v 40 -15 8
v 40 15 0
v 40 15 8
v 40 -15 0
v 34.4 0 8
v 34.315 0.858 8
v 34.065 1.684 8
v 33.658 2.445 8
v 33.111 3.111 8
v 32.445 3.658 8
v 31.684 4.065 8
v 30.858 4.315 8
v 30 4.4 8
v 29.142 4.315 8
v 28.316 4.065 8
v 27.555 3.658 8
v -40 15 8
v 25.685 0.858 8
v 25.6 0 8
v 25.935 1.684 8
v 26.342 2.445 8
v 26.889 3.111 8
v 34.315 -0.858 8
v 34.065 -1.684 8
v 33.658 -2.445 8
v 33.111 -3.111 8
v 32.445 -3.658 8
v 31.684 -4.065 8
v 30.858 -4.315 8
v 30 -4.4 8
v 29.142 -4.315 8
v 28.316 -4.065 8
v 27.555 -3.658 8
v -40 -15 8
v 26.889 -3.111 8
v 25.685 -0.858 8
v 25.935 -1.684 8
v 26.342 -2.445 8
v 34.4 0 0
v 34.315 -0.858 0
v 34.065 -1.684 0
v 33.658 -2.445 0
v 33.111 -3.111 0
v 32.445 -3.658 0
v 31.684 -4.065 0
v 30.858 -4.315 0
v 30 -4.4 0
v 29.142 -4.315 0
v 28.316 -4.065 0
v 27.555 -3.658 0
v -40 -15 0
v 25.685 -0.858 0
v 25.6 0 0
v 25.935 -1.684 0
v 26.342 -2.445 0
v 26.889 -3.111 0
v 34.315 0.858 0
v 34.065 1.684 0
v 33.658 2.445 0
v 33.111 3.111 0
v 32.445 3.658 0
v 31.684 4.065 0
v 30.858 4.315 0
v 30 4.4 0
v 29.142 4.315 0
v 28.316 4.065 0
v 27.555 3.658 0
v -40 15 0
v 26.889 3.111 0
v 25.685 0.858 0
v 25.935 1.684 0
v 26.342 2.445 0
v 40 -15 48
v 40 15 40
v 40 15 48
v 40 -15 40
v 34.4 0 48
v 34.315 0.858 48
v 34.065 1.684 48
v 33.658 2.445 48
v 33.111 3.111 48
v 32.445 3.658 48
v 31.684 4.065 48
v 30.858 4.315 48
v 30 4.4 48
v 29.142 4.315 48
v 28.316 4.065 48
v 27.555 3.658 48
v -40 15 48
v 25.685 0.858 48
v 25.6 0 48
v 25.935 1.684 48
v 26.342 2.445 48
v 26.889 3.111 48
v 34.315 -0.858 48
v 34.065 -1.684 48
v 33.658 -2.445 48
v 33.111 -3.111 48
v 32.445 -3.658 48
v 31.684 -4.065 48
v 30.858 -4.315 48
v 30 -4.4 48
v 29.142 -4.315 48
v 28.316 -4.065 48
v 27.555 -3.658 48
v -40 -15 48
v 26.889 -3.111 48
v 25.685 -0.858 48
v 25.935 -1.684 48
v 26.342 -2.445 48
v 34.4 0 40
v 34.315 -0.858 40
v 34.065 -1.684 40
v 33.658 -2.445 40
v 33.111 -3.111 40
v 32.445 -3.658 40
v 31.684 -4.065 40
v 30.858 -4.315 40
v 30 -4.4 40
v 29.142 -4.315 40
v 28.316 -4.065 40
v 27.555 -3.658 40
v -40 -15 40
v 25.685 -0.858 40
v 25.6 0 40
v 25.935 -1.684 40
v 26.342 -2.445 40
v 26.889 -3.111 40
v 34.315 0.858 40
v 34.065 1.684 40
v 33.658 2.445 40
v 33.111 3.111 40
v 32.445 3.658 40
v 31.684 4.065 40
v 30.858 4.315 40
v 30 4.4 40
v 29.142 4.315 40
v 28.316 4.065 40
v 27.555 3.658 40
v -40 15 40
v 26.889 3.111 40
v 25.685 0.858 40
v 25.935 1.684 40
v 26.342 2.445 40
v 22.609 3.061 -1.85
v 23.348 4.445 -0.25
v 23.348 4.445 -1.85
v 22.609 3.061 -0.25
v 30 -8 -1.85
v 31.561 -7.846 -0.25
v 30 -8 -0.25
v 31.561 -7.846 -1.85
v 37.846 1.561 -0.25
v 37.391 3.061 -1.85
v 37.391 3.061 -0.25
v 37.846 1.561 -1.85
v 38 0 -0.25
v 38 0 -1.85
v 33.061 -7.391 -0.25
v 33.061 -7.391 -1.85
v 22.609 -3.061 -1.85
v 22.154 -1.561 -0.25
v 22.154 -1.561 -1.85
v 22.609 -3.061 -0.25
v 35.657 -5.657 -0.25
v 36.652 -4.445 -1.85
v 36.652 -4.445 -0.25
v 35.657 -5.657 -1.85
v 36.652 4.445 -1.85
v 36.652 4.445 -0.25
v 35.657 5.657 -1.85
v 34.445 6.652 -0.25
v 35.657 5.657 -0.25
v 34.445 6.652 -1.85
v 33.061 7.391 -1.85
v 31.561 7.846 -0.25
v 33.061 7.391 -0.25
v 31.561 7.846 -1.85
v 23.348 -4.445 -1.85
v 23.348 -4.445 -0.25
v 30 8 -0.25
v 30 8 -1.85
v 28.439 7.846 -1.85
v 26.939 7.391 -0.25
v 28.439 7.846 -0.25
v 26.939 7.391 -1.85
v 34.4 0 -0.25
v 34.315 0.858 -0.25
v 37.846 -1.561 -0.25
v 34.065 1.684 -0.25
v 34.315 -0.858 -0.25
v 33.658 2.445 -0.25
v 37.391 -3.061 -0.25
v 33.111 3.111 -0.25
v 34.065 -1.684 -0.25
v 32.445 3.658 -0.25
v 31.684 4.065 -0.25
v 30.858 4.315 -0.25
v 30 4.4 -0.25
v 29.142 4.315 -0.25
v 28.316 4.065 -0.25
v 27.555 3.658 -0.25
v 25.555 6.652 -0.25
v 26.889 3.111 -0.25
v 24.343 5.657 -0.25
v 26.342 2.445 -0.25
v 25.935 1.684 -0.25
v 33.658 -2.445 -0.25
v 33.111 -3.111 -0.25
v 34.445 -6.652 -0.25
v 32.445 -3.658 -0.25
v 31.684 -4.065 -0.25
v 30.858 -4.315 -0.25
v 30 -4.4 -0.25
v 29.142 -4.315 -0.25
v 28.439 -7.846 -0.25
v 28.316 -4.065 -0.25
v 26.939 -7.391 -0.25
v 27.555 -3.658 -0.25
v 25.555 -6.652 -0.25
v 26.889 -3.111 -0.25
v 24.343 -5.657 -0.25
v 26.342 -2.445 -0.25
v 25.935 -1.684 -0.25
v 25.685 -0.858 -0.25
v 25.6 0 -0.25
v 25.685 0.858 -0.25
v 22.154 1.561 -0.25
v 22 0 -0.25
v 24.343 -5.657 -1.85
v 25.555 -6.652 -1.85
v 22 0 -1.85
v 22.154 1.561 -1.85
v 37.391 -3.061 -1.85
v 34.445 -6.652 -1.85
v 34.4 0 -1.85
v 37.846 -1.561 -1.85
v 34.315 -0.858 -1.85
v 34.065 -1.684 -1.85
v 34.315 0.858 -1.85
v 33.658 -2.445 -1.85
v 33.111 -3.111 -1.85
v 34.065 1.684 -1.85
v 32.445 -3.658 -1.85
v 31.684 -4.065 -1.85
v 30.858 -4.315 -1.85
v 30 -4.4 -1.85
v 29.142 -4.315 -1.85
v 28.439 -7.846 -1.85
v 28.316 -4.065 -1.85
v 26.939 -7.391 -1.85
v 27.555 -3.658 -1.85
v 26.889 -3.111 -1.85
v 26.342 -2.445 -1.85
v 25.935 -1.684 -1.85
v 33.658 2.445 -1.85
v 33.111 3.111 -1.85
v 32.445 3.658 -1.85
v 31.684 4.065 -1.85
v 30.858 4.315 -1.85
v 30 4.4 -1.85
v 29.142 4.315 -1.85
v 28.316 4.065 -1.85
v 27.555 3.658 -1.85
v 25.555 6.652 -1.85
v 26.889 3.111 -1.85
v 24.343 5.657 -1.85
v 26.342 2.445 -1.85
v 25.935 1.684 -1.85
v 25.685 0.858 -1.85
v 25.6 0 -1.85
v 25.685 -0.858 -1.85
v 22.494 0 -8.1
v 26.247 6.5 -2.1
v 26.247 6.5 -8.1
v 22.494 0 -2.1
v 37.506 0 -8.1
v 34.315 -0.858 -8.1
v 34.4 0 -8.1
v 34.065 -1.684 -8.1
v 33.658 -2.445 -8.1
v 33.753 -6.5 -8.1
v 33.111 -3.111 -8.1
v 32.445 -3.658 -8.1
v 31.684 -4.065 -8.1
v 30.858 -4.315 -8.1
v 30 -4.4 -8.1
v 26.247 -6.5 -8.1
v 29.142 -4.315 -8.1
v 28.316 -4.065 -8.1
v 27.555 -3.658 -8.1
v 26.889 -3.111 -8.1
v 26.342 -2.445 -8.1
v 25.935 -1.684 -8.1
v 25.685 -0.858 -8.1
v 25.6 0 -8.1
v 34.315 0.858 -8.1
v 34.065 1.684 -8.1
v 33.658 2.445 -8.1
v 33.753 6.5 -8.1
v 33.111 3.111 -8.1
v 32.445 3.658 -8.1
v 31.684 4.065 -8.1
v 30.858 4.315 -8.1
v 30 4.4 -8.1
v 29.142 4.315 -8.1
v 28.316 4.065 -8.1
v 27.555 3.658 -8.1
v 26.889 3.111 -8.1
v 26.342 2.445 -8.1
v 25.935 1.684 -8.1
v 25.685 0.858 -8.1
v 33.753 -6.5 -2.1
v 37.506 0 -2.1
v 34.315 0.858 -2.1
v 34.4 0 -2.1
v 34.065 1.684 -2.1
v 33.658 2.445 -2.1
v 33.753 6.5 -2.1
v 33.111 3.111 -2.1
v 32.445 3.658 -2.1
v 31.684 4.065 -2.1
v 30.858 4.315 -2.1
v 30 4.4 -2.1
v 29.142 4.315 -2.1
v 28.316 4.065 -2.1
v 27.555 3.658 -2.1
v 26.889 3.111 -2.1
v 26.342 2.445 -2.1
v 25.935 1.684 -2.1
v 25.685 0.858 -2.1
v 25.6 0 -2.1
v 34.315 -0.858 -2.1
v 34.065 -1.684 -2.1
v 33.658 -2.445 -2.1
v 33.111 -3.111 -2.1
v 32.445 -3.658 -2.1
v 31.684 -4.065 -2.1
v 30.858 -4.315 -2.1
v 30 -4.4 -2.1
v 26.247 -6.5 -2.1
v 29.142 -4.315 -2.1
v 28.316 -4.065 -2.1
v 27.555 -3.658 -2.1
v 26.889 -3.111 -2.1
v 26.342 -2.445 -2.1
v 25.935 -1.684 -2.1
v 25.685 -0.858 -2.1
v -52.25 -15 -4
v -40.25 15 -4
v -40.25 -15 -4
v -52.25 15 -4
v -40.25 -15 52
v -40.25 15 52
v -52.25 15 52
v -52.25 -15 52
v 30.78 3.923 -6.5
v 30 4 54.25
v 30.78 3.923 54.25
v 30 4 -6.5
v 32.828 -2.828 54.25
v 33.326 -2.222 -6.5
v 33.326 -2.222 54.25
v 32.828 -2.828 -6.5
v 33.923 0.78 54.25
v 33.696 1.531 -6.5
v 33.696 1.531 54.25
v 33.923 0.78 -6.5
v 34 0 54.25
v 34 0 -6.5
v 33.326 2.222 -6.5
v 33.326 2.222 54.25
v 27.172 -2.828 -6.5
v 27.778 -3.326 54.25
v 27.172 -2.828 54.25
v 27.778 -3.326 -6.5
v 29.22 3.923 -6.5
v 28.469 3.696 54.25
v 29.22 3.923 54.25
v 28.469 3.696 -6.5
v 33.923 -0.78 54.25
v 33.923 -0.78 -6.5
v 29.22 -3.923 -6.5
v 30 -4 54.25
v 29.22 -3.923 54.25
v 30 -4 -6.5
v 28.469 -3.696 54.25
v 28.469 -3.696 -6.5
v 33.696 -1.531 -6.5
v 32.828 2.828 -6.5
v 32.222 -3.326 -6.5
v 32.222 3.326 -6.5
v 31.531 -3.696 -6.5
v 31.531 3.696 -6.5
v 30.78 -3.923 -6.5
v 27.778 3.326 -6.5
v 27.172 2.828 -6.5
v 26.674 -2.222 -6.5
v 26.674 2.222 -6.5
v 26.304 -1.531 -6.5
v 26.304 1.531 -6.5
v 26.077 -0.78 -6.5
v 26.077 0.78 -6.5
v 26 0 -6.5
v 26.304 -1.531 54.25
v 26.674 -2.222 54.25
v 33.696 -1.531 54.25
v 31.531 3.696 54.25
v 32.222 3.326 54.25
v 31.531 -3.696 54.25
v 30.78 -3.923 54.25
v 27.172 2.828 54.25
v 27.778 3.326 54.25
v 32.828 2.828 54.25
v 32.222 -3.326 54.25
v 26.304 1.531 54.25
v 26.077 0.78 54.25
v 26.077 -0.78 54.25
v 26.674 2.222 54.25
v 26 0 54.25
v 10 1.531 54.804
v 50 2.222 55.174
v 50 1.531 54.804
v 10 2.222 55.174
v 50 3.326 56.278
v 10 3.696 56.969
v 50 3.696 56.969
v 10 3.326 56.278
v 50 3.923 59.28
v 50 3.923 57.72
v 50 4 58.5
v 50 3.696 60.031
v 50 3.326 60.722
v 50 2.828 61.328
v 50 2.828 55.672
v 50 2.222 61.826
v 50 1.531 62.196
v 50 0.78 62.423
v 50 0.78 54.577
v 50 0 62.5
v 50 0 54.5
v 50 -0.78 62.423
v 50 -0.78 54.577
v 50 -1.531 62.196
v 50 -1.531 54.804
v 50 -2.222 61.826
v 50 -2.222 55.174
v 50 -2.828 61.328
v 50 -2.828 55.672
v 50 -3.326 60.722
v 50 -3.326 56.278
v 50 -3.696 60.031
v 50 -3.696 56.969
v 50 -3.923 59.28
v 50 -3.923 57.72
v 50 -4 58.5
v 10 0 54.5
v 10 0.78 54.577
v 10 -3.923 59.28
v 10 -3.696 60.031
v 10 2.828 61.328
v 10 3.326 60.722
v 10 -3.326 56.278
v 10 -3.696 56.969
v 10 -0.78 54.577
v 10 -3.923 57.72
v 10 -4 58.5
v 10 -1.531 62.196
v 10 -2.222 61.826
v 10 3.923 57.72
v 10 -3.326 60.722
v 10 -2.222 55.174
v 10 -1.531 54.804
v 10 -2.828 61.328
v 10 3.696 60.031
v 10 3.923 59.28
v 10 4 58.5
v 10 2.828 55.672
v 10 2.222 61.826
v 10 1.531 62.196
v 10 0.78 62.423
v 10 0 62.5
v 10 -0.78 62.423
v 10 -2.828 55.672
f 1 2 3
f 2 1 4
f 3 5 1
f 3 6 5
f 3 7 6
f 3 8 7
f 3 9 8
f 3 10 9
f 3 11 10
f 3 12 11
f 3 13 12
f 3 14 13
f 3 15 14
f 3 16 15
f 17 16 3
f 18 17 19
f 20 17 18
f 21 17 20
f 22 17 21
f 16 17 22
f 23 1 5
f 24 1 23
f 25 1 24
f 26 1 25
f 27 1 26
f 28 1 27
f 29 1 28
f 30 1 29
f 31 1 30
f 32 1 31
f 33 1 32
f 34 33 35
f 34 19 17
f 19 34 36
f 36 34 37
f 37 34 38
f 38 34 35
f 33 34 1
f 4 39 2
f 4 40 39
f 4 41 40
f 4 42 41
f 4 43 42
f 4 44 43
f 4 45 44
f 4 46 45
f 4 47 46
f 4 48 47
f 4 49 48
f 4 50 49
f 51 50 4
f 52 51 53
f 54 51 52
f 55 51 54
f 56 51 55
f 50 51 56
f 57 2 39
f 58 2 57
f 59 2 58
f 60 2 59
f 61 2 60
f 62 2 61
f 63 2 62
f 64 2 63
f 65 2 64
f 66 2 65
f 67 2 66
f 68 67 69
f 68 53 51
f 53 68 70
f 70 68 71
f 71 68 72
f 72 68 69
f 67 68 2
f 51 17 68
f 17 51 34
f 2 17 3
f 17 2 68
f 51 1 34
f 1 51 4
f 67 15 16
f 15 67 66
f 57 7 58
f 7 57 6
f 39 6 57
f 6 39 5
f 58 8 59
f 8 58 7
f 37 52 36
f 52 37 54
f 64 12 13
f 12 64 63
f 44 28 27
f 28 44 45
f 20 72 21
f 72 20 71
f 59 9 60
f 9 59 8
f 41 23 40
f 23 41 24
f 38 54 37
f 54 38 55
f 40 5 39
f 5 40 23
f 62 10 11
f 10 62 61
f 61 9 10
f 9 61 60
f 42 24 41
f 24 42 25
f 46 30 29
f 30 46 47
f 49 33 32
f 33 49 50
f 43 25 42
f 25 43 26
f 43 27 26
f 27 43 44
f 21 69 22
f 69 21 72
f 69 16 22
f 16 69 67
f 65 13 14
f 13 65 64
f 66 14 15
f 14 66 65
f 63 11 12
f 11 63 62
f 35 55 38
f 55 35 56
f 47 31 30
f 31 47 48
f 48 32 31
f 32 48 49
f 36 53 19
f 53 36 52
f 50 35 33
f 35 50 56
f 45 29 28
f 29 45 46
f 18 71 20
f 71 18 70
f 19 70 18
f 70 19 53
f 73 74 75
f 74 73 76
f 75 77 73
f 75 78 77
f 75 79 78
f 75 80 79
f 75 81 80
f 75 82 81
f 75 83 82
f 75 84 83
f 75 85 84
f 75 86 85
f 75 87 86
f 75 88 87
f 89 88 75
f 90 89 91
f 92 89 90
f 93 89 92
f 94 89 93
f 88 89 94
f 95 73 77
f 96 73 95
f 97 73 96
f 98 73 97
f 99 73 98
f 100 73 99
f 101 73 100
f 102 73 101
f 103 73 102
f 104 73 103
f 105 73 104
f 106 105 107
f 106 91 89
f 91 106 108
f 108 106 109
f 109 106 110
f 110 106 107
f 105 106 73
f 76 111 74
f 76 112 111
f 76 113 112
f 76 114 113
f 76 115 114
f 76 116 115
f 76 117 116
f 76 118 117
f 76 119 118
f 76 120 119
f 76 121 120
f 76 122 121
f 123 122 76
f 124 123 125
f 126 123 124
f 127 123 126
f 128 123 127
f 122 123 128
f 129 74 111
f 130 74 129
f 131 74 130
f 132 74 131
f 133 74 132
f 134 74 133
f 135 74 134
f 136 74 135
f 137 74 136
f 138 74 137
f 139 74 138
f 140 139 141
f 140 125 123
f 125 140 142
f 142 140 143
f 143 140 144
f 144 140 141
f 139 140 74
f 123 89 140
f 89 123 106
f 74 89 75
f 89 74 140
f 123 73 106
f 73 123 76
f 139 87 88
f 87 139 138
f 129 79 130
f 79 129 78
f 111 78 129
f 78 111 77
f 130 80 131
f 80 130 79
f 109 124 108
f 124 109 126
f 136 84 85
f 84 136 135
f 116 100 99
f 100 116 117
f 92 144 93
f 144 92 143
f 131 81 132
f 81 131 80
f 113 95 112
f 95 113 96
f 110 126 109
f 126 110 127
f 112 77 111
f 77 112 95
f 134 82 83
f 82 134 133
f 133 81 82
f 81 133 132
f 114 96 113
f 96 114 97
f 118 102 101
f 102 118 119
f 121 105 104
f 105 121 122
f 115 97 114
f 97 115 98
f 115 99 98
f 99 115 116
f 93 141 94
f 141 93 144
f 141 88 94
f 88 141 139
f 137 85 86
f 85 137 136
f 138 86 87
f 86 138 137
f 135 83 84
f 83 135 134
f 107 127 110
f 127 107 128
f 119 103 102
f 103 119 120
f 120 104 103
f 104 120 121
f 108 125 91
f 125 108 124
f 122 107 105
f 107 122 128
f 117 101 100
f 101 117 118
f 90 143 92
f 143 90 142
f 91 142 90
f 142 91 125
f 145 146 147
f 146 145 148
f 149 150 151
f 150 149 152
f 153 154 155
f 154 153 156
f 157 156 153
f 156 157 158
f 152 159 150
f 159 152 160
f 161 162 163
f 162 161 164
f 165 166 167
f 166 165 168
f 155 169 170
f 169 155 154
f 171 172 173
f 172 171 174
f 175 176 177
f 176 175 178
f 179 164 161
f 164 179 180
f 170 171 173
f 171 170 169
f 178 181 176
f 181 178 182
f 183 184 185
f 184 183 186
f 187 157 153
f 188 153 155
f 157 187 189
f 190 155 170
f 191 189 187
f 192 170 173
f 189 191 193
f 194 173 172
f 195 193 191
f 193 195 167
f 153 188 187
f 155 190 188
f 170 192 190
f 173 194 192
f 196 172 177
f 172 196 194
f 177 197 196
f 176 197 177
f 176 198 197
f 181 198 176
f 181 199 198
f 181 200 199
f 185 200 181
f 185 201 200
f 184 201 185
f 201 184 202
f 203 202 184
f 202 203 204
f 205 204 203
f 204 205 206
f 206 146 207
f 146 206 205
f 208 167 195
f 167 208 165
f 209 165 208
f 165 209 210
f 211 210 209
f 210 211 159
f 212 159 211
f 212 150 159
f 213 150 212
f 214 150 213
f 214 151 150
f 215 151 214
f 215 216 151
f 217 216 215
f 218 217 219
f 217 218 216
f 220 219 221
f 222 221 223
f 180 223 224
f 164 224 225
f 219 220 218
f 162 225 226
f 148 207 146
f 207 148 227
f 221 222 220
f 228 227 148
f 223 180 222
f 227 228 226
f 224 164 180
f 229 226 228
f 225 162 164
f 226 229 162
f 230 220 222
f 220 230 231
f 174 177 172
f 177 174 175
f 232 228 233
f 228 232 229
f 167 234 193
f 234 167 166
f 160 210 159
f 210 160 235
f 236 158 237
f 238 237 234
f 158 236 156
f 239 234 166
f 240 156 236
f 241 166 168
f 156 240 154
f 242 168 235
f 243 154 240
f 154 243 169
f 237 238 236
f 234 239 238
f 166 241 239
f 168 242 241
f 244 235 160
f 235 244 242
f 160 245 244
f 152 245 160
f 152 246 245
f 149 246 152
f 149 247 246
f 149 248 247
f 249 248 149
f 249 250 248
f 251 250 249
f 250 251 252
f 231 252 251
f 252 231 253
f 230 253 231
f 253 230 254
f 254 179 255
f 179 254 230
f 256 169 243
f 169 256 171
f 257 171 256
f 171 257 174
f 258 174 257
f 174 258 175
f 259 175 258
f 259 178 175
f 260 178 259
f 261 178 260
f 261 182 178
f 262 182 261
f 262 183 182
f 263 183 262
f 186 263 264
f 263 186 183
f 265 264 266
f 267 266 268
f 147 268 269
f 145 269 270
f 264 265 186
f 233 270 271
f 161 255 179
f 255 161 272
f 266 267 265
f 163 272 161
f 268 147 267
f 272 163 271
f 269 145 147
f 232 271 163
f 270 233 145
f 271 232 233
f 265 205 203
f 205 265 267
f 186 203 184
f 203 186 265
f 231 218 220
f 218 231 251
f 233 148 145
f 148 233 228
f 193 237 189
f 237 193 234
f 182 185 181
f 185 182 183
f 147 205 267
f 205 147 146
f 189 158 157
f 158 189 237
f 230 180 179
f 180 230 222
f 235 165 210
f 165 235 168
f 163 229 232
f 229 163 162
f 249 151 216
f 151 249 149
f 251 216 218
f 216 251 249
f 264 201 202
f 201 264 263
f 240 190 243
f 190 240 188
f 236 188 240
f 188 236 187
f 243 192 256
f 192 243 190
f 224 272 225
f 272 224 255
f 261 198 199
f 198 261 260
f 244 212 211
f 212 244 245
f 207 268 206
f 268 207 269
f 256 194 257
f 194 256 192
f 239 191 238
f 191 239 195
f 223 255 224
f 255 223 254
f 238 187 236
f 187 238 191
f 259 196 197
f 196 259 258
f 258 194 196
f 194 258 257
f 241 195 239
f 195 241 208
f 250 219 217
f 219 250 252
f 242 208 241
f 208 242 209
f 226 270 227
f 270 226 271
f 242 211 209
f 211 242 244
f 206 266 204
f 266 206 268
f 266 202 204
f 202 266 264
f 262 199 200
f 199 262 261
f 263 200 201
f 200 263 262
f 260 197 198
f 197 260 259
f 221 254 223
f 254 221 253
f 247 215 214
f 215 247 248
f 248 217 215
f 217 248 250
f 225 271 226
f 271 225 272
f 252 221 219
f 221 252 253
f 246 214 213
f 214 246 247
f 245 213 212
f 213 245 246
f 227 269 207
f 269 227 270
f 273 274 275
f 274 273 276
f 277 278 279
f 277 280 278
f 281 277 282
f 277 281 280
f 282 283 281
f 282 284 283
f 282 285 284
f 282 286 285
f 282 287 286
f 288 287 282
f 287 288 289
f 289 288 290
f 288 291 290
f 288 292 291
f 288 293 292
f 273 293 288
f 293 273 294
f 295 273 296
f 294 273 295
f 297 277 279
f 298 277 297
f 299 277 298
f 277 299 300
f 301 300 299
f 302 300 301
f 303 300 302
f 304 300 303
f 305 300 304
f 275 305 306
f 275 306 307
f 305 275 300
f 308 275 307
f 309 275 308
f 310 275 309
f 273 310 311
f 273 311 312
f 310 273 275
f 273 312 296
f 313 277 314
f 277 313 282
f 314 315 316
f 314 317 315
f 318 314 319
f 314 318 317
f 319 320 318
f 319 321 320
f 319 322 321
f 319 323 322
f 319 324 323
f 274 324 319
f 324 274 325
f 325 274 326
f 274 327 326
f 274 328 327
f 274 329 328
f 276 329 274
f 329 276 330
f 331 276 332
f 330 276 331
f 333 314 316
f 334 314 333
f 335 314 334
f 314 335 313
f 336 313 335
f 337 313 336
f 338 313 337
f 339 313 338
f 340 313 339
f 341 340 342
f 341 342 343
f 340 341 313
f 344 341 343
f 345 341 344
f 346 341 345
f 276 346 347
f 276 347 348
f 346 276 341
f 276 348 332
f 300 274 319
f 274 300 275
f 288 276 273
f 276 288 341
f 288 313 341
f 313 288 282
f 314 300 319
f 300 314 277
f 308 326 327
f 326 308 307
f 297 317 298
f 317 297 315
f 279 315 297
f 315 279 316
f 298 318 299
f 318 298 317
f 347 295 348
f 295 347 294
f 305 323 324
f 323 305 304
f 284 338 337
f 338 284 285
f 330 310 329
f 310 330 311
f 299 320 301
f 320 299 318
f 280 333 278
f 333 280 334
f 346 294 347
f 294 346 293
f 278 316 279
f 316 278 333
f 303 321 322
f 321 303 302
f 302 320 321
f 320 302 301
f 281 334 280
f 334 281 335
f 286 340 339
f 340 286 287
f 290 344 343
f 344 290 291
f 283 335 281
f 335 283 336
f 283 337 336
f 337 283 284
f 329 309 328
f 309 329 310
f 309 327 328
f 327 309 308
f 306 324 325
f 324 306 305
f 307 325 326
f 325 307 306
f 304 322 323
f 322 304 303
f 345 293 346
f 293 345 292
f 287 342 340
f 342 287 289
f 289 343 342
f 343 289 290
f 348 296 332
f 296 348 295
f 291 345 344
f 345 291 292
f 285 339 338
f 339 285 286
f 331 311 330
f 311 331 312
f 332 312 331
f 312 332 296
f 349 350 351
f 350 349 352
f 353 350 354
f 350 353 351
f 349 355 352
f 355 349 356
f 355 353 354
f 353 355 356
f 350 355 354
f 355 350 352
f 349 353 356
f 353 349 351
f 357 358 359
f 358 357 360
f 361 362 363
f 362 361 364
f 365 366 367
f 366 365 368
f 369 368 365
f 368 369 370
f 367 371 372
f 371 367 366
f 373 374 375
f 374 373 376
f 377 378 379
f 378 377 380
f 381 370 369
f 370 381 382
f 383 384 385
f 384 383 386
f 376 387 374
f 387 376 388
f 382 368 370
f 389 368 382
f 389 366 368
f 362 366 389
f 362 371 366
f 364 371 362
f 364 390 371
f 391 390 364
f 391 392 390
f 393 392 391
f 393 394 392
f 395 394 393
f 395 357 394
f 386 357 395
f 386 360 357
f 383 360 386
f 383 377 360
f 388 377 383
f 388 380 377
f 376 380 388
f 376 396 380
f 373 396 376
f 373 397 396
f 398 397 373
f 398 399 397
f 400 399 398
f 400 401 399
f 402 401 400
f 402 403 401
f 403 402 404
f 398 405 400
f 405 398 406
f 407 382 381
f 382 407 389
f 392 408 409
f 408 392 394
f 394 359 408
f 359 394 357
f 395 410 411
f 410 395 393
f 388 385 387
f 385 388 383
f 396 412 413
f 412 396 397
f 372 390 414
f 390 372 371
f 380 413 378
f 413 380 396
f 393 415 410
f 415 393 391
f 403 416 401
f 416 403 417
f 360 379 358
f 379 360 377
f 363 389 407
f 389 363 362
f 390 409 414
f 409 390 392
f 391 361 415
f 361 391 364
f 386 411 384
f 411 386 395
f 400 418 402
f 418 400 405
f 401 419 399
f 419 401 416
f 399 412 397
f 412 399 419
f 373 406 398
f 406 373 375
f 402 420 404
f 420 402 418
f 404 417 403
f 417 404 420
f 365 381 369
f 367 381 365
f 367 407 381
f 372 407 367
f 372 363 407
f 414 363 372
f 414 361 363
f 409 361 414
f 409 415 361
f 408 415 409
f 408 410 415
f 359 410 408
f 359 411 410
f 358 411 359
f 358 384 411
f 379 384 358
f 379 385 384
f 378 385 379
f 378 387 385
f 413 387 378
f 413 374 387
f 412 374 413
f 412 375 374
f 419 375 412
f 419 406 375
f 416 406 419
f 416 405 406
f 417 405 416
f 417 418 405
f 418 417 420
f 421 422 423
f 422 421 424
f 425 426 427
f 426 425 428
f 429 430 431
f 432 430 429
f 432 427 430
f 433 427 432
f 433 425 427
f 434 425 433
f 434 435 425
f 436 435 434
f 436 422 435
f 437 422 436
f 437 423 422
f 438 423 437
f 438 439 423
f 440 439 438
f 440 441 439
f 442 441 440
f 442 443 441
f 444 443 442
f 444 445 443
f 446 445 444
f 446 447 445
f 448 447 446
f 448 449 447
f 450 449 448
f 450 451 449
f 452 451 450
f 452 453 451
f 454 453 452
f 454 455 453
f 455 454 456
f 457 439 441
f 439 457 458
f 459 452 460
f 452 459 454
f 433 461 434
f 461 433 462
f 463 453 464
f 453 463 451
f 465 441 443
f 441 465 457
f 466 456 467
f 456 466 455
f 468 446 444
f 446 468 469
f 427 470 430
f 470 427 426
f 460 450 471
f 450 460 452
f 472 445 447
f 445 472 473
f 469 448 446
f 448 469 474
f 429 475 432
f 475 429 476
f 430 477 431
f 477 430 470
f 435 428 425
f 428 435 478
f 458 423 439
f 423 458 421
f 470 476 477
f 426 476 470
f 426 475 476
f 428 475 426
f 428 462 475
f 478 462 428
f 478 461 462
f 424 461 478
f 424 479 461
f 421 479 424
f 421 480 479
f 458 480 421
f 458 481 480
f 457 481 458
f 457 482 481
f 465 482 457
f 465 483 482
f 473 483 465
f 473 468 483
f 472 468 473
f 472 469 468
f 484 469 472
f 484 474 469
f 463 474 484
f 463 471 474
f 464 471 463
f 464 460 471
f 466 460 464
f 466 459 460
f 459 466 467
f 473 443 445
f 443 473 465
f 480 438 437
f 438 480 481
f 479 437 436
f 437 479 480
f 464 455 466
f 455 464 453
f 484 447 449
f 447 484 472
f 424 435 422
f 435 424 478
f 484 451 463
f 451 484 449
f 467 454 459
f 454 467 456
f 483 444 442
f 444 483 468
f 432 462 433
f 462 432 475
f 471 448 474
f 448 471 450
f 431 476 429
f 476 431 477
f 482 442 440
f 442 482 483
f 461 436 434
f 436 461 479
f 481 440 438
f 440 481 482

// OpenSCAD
$fn = 32;

// ------------------------------------------------------------------------
// C clamp: throat 40 mm, screw d8
// Every part is its own module, assembly() places every instance.
// ------------------------------------------------------------------------

// --- part 1 ---
module clamp_arm() {
  difference() {
    translate([-40, -15, 0]) cube([80, 30, 8]);
    translate([30, 0, -1]) cylinder(h = 10, d = 8.8);
  }
}

// --- part 2 ---
module clamp_spine() {
  difference() {
    translate([-28, -15, 0]) cube([56, 30, 12]);
  }
}

// --- part 3 ---
module clamp_screw() {
  translate([0, 0, -30.375]) cylinder(h = 60.75, d = 8);
}

// --- part 4 ---
module clamp_washer() {
  difference() {
      translate([0, 0, 0]) cylinder(h = 1.6, d = 16);
      translate([0, 0, -1]) cylinder(h = 3.6, d = 8.8);
    }
}

// --- part 5 ---
module clamp_nut() {
  difference() {
    linear_extrude(height = 6) polygon(points = [[7.506, 0], [3.753, 6.5], [-3.753, 6.5], [-7.506, 0], [-3.753, -6.5], [3.753, -6.5]]);
    translate([0, 0, -1]) cylinder(h = 8, d = 8.8);
  }
}

// --- part 6 ---
module tommy_bar() {
  translate([0, 0, -20]) cylinder(h = 40, d = 8);
}

// --- assembly ---
module assembly() {
  color([0.80, 0.24, 0.20]) translate([0, 0, 0]) rotate([0, 0, 0]) clamp_arm();
  color([0.20, 0.45, 0.75]) translate([0, 0, 40]) rotate([0, 0, 0]) clamp_arm();
  color([0.25, 0.62, 0.32]) translate([-52.25, 0, 24]) rotate([0, 90, 0]) clamp_spine();
  color([0.92, 0.70, 0.18]) translate([30, 0, 23.875]) rotate([0, 0, 0]) clamp_screw();
  color([0.58, 0.35, 0.70]) translate([30, 0, -1.85]) rotate([0, 0, 0]) clamp_washer();
  color([0.16, 0.66, 0.66]) translate([30, 0, -8.1]) rotate([0, 0, 0]) clamp_nut();
  color([0.85, 0.48, 0.18]) translate([30, 0, 58.5]) rotate([0, 90, 0]) tommy_bar();
}

assembly();
